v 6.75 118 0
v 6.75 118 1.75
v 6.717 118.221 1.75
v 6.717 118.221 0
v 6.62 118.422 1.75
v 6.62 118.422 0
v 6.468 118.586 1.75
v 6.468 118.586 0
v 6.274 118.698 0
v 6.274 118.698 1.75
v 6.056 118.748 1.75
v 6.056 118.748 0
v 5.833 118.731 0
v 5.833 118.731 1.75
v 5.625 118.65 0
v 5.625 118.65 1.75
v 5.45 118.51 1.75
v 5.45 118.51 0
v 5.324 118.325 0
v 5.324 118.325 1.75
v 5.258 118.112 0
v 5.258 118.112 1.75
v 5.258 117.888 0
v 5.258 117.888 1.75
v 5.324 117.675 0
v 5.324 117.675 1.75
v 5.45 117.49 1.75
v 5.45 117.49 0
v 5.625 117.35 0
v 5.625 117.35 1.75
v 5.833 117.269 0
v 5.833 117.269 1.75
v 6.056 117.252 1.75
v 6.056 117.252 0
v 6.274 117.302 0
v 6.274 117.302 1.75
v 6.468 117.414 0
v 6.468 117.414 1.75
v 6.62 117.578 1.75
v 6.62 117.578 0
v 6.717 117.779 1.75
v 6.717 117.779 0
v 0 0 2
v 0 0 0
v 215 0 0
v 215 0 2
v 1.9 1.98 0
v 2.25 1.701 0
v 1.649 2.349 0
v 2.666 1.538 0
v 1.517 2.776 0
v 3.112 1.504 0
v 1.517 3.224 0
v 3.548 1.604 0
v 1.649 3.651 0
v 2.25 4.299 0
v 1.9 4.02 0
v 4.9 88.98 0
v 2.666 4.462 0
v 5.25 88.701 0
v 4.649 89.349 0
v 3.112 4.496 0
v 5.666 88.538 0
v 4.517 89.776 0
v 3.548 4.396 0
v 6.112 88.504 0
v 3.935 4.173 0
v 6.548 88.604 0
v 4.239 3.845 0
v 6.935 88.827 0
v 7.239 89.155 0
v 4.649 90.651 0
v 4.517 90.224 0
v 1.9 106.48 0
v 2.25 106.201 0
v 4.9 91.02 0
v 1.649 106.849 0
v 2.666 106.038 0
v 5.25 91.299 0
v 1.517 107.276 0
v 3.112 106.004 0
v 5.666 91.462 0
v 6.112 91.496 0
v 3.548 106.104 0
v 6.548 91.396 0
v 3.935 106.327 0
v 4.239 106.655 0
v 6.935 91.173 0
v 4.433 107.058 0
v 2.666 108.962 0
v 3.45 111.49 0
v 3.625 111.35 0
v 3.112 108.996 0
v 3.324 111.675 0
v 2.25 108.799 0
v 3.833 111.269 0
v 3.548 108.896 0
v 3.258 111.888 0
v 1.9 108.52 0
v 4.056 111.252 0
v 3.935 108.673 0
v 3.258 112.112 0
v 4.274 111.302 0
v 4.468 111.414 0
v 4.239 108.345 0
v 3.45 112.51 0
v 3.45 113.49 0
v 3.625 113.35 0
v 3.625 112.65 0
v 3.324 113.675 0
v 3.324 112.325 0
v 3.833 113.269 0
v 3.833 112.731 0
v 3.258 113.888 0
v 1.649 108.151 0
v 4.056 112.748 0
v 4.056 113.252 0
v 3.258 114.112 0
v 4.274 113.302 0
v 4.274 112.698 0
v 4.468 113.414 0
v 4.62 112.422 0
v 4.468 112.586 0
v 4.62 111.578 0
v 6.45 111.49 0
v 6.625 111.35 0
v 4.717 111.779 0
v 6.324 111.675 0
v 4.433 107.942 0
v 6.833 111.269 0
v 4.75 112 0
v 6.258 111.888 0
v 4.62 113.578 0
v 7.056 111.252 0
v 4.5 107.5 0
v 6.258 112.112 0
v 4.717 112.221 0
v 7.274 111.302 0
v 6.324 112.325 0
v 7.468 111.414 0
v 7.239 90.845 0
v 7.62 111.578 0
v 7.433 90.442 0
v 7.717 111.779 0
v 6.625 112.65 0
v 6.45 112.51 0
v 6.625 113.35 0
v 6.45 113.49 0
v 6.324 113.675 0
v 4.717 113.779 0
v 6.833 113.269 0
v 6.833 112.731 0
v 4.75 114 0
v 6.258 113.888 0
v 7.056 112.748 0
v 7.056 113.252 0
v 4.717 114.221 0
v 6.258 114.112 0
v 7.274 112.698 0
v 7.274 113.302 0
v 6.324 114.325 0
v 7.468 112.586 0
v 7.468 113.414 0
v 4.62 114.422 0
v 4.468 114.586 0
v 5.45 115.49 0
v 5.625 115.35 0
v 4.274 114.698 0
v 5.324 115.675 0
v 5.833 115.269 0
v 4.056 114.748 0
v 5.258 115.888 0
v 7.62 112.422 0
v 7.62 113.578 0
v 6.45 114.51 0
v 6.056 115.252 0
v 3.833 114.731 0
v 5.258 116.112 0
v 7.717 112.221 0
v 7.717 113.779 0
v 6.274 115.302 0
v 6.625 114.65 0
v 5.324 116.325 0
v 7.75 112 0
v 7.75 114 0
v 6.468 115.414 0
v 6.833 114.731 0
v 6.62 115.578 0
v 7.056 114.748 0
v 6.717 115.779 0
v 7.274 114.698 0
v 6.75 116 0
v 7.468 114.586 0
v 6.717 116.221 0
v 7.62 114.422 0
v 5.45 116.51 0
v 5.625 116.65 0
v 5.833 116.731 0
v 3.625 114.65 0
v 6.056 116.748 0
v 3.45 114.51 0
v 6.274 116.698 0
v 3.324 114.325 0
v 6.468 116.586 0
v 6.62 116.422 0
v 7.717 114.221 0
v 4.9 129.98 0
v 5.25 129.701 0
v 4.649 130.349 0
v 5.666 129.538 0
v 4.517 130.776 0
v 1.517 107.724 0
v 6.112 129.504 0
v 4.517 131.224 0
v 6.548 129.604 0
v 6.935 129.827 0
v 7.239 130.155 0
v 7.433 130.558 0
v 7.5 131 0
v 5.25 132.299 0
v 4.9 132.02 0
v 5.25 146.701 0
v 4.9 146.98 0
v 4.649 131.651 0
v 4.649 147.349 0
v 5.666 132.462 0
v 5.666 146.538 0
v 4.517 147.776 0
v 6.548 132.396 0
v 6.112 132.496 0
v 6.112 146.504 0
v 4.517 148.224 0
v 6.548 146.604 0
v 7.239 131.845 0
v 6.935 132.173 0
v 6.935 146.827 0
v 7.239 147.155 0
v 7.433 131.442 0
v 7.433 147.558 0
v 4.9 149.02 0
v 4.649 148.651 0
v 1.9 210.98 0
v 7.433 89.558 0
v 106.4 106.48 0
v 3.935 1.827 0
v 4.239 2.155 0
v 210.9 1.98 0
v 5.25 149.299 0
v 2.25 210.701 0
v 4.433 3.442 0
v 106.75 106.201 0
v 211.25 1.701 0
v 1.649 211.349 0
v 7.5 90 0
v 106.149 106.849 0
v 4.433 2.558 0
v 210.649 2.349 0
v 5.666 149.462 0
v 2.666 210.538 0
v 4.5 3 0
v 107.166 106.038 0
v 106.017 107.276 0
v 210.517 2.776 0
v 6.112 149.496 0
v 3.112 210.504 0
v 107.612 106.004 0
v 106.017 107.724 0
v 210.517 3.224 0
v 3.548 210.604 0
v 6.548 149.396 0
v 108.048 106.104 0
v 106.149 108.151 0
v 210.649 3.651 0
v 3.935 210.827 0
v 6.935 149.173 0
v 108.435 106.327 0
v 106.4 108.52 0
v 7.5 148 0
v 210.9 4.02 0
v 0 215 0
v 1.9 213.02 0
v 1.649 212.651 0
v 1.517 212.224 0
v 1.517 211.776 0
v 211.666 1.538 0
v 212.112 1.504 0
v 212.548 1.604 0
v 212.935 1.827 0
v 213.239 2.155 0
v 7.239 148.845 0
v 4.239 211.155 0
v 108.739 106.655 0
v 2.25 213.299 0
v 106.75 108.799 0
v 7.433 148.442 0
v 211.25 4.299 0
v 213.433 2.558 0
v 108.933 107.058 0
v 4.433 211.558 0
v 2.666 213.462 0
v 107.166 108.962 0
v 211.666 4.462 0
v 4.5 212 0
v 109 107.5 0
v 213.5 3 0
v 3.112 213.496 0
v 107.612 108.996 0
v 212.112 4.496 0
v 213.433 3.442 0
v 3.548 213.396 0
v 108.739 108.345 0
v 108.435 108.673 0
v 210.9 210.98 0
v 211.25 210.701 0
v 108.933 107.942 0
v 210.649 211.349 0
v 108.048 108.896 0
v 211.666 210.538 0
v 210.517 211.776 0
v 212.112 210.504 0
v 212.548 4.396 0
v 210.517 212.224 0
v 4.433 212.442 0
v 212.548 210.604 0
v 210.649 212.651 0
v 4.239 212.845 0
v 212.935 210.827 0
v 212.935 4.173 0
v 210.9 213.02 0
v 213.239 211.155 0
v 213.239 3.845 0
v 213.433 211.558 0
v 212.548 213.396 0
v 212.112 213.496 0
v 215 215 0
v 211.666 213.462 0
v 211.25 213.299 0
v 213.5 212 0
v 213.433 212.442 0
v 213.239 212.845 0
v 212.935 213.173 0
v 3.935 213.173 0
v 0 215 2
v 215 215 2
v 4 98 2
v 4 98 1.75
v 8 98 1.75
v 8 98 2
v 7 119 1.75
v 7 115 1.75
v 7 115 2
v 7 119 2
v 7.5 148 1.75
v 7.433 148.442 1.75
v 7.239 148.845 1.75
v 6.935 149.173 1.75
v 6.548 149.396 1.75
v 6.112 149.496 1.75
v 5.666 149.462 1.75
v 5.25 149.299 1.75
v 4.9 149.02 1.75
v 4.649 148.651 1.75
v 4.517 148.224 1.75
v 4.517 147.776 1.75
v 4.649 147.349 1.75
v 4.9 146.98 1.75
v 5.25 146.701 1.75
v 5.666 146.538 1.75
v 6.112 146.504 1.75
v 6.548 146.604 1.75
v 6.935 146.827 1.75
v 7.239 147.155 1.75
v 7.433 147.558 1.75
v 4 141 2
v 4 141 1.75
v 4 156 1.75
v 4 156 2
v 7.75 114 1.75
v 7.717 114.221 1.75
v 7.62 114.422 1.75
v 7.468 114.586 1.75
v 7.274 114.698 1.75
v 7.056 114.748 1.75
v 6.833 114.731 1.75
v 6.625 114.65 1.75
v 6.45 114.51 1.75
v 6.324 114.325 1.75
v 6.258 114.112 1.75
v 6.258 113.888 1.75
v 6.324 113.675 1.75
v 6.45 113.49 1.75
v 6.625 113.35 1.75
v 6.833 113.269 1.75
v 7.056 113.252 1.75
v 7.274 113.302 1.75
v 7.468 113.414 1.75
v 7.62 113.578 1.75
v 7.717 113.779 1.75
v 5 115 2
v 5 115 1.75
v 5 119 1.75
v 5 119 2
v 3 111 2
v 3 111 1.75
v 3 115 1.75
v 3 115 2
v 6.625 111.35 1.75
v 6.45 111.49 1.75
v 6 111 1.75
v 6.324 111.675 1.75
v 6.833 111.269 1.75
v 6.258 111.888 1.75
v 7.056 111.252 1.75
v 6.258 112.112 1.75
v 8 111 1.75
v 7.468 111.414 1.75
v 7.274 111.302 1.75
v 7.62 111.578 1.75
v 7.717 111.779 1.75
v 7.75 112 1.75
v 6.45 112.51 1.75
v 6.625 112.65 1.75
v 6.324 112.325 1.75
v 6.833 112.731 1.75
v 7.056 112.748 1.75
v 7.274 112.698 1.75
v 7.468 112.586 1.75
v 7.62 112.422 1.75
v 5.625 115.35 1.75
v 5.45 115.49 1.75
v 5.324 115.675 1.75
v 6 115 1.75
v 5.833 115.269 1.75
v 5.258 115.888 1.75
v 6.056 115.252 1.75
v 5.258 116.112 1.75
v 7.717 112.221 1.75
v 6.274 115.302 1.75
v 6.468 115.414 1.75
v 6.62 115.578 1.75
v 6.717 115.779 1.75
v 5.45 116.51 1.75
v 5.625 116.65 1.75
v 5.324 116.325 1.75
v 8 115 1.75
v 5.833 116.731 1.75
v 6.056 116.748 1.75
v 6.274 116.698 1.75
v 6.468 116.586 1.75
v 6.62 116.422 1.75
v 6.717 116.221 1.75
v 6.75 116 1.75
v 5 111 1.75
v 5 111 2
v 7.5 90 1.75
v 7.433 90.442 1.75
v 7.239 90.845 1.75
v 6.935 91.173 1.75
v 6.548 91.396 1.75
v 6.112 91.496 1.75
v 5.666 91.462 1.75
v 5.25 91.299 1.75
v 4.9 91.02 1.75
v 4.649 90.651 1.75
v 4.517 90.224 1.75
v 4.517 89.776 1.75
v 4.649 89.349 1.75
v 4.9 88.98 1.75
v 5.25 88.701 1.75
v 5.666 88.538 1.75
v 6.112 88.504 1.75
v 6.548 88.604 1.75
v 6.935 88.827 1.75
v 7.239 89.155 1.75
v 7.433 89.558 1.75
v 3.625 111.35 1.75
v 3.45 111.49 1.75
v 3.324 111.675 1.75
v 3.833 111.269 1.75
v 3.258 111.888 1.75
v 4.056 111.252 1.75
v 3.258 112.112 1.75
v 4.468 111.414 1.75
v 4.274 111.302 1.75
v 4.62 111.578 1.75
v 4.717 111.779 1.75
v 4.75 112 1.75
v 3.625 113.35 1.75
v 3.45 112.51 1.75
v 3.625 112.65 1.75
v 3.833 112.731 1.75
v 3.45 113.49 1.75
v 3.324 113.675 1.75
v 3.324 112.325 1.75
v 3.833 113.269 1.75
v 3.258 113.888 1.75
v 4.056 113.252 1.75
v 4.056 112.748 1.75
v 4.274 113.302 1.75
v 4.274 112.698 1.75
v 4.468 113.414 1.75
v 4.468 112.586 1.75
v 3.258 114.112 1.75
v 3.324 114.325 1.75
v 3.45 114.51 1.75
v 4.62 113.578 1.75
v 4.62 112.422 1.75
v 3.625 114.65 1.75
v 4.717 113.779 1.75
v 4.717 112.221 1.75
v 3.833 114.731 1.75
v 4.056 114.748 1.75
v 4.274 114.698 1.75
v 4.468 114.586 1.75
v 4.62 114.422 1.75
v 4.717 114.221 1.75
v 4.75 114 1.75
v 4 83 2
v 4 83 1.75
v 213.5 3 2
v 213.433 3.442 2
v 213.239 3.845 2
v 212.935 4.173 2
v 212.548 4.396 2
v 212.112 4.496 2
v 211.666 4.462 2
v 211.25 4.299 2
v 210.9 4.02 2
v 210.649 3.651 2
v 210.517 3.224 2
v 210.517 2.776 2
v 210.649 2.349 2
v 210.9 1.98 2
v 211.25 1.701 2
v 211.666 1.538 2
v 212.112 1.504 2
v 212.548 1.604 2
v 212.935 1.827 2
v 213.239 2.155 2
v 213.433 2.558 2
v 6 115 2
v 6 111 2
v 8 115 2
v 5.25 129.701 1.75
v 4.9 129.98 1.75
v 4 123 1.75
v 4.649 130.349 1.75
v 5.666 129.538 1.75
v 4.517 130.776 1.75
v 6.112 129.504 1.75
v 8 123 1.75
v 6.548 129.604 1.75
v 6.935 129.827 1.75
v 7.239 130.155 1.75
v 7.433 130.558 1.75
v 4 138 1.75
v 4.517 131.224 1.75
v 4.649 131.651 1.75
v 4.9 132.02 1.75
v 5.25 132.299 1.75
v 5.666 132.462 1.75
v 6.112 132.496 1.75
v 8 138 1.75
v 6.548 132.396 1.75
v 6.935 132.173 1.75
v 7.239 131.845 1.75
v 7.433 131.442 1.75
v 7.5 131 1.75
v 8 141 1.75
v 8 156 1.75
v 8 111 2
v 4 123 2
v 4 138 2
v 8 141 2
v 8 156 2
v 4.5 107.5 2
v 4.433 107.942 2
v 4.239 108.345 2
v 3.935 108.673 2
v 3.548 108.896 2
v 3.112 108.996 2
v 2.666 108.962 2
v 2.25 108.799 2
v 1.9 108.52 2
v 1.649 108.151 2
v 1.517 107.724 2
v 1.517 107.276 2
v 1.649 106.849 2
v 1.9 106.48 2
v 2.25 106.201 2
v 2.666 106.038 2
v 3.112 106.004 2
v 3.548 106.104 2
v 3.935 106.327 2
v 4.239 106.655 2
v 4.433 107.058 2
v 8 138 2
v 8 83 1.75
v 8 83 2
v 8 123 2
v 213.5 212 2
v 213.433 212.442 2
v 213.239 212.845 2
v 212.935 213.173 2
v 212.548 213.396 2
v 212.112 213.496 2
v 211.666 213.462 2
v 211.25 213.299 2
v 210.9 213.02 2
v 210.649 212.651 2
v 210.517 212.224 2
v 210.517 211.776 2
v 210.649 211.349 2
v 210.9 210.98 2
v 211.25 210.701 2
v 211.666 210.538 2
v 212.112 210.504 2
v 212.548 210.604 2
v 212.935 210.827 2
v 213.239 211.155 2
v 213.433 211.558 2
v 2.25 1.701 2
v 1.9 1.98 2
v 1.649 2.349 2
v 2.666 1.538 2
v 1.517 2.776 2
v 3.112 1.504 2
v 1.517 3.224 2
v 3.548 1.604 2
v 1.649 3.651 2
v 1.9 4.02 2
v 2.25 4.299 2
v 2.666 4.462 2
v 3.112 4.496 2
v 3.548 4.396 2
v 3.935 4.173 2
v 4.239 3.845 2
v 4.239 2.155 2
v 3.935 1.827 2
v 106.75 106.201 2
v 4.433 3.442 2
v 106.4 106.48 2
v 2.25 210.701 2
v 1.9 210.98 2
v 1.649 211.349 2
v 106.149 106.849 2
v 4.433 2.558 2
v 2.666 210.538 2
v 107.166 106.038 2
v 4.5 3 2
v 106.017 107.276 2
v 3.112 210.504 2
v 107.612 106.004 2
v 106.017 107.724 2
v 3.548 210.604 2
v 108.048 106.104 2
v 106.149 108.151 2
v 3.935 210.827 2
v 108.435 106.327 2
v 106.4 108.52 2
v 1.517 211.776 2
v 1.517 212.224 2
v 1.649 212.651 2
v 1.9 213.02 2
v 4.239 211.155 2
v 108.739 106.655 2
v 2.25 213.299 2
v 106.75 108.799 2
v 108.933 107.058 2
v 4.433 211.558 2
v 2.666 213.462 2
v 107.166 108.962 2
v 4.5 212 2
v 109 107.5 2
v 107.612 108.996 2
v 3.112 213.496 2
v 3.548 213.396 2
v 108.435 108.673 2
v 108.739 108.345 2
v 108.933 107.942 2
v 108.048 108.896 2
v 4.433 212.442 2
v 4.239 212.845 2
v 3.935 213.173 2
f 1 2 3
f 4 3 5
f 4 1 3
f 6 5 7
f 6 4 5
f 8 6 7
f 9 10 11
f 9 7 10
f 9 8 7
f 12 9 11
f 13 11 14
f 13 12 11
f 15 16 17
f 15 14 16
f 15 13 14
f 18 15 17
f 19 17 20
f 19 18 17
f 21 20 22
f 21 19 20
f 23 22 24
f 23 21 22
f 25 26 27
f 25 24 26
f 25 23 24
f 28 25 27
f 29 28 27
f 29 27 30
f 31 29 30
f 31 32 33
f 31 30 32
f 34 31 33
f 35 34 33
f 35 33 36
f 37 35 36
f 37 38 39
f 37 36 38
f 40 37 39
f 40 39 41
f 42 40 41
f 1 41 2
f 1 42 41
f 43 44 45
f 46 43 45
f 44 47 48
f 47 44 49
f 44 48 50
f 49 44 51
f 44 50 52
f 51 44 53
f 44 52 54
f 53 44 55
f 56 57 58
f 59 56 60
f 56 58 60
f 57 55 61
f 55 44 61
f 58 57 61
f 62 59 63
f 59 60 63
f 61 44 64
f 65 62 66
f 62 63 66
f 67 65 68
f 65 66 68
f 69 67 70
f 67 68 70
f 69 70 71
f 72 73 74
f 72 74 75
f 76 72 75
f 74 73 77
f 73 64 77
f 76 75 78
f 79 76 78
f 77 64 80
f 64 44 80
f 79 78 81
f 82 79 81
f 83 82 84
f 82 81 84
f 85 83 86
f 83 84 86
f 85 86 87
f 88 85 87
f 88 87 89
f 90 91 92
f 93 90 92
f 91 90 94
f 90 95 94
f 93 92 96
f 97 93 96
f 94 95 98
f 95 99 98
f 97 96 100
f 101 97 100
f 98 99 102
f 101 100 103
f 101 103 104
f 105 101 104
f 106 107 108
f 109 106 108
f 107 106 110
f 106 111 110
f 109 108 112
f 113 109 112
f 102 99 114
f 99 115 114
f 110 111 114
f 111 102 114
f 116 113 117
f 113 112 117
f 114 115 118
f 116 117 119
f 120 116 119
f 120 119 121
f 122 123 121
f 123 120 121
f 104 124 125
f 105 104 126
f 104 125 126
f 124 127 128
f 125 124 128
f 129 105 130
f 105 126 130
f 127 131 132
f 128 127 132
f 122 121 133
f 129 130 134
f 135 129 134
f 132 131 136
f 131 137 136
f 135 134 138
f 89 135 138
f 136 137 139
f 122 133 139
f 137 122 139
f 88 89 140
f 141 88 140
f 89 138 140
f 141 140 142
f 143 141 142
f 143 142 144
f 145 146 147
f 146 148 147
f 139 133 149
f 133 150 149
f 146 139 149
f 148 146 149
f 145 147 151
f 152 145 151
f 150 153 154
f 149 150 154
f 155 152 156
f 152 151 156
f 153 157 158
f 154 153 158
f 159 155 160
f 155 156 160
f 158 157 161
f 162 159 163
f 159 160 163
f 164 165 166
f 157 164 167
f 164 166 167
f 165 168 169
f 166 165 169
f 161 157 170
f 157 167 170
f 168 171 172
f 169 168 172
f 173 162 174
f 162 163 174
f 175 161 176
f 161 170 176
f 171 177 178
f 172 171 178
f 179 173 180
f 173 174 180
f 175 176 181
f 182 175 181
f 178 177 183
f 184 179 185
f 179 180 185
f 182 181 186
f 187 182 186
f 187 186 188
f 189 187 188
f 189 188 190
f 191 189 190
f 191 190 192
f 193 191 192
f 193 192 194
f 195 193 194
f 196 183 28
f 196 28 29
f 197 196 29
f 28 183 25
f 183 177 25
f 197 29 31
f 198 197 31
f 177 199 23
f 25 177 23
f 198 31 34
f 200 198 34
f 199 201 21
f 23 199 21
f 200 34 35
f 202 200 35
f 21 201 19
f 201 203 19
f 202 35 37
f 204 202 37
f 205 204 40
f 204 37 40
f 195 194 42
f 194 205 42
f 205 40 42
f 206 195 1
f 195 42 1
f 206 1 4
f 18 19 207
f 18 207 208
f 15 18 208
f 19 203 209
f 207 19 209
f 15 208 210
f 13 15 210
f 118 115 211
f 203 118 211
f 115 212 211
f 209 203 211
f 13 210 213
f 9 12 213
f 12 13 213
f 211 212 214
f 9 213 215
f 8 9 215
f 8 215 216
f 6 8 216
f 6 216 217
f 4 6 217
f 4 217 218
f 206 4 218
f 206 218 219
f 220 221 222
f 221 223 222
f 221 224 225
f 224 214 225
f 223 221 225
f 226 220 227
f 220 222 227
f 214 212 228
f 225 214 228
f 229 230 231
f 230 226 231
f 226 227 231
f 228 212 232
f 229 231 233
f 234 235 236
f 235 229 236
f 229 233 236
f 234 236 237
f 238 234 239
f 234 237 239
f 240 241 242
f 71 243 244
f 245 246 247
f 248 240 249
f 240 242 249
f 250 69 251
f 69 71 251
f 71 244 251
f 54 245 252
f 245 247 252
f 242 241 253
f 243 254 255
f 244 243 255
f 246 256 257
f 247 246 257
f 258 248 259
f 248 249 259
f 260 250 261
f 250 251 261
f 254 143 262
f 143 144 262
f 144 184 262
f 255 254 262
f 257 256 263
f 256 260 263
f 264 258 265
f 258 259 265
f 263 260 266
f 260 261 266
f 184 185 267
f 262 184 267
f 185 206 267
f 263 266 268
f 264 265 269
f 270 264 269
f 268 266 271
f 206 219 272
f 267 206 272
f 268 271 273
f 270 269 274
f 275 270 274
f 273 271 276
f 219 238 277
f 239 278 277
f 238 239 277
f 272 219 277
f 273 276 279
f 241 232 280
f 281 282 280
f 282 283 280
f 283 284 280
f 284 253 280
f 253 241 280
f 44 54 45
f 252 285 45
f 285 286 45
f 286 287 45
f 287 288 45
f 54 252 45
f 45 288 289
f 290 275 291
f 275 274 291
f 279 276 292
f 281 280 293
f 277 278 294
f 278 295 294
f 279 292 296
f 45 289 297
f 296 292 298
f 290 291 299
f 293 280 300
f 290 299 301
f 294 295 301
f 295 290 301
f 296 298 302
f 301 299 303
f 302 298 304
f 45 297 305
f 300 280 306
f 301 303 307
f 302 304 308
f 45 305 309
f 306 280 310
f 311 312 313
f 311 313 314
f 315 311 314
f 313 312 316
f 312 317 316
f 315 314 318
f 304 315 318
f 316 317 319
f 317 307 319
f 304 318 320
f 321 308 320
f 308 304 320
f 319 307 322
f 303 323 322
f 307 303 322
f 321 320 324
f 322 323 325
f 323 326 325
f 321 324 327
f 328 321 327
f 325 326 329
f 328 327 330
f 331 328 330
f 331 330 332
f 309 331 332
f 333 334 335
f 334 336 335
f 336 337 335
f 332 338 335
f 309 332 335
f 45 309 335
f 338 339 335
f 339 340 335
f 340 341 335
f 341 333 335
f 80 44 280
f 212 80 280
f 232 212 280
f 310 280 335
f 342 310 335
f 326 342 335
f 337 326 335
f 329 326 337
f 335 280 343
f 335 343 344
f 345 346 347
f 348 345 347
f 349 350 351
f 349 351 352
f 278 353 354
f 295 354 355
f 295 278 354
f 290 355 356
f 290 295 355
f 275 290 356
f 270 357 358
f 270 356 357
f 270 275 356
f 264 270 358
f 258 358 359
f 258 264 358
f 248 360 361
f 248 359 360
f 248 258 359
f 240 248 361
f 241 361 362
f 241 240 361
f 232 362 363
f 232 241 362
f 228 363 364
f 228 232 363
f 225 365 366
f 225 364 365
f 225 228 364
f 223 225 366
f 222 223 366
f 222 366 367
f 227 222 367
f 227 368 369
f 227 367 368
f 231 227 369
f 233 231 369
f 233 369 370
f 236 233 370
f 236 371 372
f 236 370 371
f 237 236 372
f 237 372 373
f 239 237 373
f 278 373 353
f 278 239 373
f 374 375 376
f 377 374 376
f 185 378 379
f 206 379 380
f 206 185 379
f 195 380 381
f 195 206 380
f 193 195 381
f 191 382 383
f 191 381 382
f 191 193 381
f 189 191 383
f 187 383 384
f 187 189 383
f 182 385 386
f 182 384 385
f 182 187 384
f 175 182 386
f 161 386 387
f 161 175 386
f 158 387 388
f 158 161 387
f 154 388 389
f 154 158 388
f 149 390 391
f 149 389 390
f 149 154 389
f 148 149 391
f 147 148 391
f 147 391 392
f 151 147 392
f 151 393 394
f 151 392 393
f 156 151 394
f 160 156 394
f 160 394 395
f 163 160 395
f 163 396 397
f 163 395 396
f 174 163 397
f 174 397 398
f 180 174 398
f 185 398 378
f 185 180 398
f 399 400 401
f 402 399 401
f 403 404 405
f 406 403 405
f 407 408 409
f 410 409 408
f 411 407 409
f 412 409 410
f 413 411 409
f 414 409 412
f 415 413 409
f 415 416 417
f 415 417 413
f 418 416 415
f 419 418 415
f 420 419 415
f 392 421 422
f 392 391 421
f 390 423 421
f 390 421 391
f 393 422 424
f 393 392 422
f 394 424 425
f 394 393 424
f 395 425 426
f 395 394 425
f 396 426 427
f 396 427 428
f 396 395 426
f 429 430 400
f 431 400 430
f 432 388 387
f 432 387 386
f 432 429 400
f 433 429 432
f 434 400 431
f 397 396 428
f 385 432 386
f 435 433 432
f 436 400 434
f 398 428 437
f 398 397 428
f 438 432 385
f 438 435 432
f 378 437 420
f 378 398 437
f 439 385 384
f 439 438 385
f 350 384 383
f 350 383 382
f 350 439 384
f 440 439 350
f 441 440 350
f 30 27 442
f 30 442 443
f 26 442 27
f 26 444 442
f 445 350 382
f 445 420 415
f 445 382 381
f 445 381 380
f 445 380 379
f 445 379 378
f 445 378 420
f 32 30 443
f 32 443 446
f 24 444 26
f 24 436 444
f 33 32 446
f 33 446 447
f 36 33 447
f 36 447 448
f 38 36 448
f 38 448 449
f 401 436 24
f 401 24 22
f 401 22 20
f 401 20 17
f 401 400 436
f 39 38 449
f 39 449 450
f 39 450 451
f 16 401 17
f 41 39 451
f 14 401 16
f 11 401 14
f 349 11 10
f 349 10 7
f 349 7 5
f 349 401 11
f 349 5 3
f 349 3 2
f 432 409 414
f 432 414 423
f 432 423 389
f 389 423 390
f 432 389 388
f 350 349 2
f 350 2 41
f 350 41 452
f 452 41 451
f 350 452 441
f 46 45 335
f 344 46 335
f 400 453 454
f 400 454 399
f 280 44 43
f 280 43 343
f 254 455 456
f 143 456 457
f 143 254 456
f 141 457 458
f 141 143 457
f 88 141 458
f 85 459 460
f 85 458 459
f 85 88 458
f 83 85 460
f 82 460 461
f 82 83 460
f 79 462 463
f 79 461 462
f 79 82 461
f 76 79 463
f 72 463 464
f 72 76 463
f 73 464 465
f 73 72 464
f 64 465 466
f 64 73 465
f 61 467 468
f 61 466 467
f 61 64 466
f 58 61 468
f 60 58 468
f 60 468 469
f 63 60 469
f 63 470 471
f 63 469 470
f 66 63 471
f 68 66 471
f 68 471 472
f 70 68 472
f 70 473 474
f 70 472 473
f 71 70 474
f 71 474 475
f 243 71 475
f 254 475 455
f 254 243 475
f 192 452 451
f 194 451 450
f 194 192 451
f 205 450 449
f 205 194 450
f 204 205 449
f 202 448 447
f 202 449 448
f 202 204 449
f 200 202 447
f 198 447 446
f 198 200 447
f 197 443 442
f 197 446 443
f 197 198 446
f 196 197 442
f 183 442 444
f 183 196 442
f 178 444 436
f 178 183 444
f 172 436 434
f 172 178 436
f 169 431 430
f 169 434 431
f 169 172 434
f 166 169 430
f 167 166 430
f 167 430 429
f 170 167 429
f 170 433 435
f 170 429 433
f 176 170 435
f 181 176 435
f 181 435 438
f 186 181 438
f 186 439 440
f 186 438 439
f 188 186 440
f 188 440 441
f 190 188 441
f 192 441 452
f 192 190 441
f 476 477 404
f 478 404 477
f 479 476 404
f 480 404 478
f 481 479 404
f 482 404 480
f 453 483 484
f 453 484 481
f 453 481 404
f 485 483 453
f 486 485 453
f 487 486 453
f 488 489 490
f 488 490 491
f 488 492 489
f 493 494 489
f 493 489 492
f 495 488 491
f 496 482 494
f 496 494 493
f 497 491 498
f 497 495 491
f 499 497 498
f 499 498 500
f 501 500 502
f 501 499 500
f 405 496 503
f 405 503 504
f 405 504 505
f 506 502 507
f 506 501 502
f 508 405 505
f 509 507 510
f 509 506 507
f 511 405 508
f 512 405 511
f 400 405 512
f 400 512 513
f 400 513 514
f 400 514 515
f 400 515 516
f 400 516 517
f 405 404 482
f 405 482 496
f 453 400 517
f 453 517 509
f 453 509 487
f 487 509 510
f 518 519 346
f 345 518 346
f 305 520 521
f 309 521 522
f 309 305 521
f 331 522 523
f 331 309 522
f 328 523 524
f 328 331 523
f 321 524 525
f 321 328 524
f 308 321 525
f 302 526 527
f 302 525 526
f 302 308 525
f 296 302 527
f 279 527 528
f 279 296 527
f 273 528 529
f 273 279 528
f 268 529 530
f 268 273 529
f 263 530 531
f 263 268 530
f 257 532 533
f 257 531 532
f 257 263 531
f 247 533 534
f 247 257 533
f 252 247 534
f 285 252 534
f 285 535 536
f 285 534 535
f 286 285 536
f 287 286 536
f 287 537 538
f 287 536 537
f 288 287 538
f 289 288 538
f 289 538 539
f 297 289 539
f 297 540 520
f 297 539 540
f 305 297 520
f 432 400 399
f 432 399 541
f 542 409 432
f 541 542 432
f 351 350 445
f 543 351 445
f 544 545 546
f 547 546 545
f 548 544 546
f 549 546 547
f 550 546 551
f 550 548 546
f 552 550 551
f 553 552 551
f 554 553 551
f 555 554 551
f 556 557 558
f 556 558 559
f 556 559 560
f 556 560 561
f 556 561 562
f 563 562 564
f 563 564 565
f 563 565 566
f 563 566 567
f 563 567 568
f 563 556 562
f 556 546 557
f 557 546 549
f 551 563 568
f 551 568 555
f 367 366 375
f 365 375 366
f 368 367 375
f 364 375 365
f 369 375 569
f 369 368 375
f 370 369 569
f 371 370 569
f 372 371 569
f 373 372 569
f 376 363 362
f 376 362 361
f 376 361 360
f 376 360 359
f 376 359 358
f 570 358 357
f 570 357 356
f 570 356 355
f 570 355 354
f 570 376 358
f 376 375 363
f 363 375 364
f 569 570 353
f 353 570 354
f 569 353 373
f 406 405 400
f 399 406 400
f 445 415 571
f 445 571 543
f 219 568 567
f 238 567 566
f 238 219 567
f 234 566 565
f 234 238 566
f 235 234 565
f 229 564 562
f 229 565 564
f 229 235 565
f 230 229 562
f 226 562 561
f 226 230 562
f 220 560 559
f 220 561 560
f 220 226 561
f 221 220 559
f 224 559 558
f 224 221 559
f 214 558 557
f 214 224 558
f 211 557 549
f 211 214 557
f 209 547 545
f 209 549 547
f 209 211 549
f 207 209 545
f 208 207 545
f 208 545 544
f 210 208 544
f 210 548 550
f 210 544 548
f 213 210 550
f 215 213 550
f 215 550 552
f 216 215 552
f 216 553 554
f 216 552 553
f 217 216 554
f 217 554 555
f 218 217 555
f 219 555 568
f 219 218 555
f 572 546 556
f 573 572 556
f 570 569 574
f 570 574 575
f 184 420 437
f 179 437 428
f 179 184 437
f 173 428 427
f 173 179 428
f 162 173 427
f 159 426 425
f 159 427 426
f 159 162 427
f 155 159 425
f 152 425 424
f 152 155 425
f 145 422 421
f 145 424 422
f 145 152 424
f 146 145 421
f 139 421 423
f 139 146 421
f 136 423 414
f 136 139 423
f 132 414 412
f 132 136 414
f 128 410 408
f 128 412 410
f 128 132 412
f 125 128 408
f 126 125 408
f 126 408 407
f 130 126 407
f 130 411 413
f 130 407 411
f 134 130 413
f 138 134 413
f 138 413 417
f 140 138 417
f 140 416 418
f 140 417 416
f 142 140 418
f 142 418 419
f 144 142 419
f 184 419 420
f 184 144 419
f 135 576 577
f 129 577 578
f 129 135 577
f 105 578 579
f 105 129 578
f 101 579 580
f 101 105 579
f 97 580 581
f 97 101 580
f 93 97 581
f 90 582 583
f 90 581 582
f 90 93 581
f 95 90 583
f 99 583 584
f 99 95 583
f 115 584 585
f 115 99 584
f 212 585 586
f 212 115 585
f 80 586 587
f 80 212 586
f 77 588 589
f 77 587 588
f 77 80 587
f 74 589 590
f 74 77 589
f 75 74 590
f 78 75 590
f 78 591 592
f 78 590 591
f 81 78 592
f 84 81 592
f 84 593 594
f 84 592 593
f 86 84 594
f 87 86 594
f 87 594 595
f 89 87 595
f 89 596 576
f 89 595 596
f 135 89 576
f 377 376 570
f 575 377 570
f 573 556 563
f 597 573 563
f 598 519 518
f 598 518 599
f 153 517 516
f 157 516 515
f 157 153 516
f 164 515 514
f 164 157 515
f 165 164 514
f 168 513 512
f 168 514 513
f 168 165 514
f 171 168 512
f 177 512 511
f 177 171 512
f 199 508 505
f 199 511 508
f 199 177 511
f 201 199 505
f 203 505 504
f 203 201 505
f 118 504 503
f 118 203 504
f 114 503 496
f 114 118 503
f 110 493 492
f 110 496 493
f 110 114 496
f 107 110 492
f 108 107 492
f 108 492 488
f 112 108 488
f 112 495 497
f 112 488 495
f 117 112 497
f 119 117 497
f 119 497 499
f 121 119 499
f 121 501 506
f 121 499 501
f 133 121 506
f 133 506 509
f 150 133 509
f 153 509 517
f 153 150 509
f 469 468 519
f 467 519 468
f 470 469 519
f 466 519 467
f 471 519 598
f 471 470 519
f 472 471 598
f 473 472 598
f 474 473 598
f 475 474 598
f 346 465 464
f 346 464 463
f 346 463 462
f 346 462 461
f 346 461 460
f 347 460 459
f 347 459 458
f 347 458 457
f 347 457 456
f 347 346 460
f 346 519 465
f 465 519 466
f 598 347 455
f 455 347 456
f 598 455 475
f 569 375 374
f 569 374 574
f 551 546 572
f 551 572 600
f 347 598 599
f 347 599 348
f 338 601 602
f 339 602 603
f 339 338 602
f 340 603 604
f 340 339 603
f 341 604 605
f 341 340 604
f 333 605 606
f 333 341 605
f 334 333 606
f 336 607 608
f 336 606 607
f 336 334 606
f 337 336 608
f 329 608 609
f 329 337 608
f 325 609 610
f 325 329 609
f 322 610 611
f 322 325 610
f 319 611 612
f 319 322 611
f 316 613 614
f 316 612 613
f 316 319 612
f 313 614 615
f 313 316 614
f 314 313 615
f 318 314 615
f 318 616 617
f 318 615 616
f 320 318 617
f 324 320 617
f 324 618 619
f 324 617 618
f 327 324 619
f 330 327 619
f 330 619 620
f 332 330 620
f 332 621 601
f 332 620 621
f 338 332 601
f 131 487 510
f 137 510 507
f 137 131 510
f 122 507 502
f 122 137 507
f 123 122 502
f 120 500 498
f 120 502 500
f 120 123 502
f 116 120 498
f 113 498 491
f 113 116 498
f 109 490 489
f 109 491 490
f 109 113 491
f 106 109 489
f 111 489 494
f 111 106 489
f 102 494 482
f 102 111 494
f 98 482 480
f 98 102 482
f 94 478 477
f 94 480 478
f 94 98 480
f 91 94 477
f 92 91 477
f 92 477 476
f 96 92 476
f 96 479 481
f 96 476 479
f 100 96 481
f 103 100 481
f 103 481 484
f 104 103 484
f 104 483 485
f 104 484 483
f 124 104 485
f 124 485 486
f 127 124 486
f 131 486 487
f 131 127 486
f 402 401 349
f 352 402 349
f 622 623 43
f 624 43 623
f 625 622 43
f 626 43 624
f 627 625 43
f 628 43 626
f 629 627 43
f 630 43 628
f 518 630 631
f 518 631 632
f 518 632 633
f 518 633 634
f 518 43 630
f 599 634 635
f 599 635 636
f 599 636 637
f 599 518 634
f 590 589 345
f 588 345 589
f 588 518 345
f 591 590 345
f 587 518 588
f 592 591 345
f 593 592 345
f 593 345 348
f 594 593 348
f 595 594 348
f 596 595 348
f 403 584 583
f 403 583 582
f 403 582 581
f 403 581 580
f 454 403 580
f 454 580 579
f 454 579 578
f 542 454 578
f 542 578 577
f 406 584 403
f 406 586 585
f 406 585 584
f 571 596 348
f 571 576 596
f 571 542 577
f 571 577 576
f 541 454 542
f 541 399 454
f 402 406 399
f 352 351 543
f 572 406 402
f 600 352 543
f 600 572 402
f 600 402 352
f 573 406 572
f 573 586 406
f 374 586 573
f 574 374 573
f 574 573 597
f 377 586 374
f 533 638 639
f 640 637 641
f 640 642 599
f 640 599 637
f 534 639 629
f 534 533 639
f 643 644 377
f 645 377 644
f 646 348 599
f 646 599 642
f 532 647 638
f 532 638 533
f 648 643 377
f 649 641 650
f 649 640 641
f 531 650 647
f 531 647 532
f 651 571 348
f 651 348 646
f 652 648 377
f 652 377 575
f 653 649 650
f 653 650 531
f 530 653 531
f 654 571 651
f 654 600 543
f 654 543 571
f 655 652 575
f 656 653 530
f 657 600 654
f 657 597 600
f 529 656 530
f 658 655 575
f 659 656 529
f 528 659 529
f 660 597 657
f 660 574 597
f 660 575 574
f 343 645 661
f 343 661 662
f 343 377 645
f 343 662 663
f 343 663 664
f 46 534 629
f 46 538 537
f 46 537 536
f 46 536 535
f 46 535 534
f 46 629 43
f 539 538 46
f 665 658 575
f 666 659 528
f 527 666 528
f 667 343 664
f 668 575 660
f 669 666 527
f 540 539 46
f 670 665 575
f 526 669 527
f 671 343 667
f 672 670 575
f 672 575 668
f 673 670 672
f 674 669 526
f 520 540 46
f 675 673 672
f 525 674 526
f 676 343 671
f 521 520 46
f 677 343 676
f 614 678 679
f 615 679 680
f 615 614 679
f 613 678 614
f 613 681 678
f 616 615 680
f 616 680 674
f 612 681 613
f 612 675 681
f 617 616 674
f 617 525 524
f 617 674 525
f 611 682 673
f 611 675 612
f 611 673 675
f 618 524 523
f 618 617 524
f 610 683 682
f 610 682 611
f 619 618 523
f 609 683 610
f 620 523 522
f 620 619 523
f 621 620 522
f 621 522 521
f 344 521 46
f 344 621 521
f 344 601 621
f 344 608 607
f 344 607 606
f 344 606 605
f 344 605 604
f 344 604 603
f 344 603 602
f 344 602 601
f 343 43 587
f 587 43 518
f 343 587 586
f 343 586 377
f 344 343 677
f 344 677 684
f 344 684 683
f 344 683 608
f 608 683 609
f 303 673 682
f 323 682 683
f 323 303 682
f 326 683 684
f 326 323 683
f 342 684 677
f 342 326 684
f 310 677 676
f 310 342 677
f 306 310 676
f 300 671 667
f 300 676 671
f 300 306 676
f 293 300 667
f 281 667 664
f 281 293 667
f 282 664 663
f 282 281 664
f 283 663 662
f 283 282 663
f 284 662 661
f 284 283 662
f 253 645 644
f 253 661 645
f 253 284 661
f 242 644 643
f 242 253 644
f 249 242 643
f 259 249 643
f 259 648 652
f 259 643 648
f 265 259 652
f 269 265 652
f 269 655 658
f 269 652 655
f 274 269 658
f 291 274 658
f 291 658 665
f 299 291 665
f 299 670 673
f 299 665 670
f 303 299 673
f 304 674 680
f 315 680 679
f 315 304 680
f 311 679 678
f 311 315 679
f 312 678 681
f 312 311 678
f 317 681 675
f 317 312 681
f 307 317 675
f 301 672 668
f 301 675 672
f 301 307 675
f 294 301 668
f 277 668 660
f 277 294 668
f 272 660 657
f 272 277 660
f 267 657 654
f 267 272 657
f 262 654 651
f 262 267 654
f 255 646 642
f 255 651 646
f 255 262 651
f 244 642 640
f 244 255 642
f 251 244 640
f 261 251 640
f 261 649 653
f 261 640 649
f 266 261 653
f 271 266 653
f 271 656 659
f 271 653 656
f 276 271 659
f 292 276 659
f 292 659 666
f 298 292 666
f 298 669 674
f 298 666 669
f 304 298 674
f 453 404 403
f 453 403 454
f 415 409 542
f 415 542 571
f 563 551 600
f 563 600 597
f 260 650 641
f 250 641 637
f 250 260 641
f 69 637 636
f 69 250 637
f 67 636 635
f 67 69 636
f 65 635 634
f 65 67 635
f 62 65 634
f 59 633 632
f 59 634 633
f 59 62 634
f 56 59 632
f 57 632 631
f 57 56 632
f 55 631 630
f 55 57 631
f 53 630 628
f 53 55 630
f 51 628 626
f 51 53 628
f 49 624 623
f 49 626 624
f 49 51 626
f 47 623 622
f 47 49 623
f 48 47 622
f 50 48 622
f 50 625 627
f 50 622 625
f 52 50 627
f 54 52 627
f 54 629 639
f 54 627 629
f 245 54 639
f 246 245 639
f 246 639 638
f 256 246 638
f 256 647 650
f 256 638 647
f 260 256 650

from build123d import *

# Parameters (mm, degrees)
BOX005_W          = 2
BOX005_H          = 4
BOX005_DEPTH      = 0.5
BOX006_W          = 2
BOX006_H          = 4
BOX006_DEPTH      = 0.5
BOX004_W          = 2
BOX004_H          = 4
BOX004_DEPTH      = 0.5
BOX003_W          = 4
BOX003_H          = 15
BOX003_DEPTH      = 0.5
BOX002_W          = 4
BOX002_H          = 15
BOX002_DEPTH      = 0.5
BOX001_W          = 4
BOX001_H          = 15
BOX001_DEPTH      = 0.5
CYLINDER012_R     = 0.75
CYLINDER012_DEPTH = 10
CYLINDER011_R     = 0.75
CYLINDER011_DEPTH = 10
CYLINDER010_R     = 0.75
CYLINDER010_DEPTH = 10
CYLINDER014_R     = 0.75
CYLINDER014_DEPTH = 10
CYLINDER013_R     = 0.75
CYLINDER013_DEPTH = 10
CYLINDER009_R     = 0.75
CYLINDER009_DEPTH = 10
CYLINDER006_R     = 1.5
CYLINDER006_DEPTH = 10
CYLINDER007_R     = 1.5
CYLINDER007_DEPTH = 10
CYLINDER008_R     = 1.5
CYLINDER008_DEPTH = 10
CYLINDER005_R     = 1.5
CYLINDER005_DEPTH = 10
CYLINDER003_R     = 1.5
CYLINDER003_DEPTH = 10
CYLINDER004_R     = 1.5
CYLINDER004_DEPTH = 10
CYLINDER002_R     = 1.5
CYLINDER002_DEPTH = 10
CYLINDER_R        = 1.5
CYLINDER_DEPTH    = 10
CYLINDER001_R     = 1.5
CYLINDER001_DEPTH = 10
BOX_W             = 215
BOX_H             = 215
BOX_DEPTH         = 2


with BuildPart() as cube005:
    # Box005 → Box005 (new body)
    with BuildSketch(Plane(origin=(6, 111, 1.75), x_dir=(1, 0, 0), z_dir=(0, 0, 1))):
        with Locations((1, 2)):
            Rectangle(BOX005_W, BOX005_H)
    extrude(amount=BOX005_DEPTH)


with BuildPart() as cube006:
    # Box006 → Box006 (new body)
    with BuildSketch(Plane(origin=(5, 115, 1.75), x_dir=(1, 0, 0), z_dir=(0, 0, 1))):
        with Locations((1, 2)):
            Rectangle(BOX006_W, BOX006_H)
    extrude(amount=BOX006_DEPTH)


with BuildPart() as cube004:
    # Box004 → Box004 (new body)
    with BuildSketch(Plane(origin=(3, 111, 1.75), x_dir=(1, 0, 0), z_dir=(0, 0, 1))):
        with Locations((1, 2)):
            Rectangle(BOX004_W, BOX004_H)
    extrude(amount=BOX004_DEPTH)


with BuildPart() as cube003:
    # Box003 → Box003 (new body)
    with BuildSketch(Plane(origin=(4, 141, 1.75), x_dir=(1, 0, 0), z_dir=(0, 0, 1))):
        with Locations((2, 7.5)):
            Rectangle(BOX003_W, BOX003_H)
    extrude(amount=BOX003_DEPTH)


with BuildPart() as cube002:
    # Box002 → Box002 (new body)
    with BuildSketch(Plane(origin=(4, 123, 1.75), x_dir=(1, 0, 0), z_dir=(0, 0, 1))):
        with Locations((2, 7.5)):
            Rectangle(BOX002_W, BOX002_H)
    extrude(amount=BOX002_DEPTH)


with BuildPart() as cube001:
    # Box001 → Box001 (new body)
    with BuildSketch(Plane(origin=(4, 83, 1.75), x_dir=(1, 0, 0), z_dir=(0, 0, 1))):
        with Locations((2, 7.5)):
            Rectangle(BOX001_W, BOX001_H)
    extrude(amount=BOX001_DEPTH)


with BuildPart() as cylinder012:
    # Cylinder012 → Cylinder012 (new body)
    with BuildSketch(Plane(origin=(6, 118, 0), x_dir=(1, 0, 0), z_dir=(0, 0, 1))):
        Circle(CYLINDER012_R)
    extrude(amount=CYLINDER012_DEPTH)


with BuildPart() as cylinder011:
    # Cylinder011 → Cylinder011 (new body)
    with BuildSketch(Plane(origin=(6, 116, 0), x_dir=(1, 0, 0), z_dir=(0, 0, 1))):
        Circle(CYLINDER011_R)
    extrude(amount=CYLINDER011_DEPTH)


with BuildPart() as cylinder010:
    # Cylinder010 → Cylinder010 (new body)
    with BuildSketch(Plane(origin=(4, 114, 0), x_dir=(1, 0, 0), z_dir=(0, 0, 1))):
        Circle(CYLINDER010_R)
    extrude(amount=CYLINDER010_DEPTH)


with BuildPart() as cylinder014:
    # Cylinder014 → Cylinder014 (new body)
    with BuildSketch(Plane(origin=(7, 114, 0), x_dir=(1, 0, 0), z_dir=(0, 0, 1))):
        Circle(CYLINDER014_R)
    extrude(amount=CYLINDER014_DEPTH)


with BuildPart() as cylinder013:
    # Cylinder013 → Cylinder013 (new body)
    with BuildSketch(Plane(origin=(7, 112, 0), x_dir=(1, 0, 0), z_dir=(0, 0, 1))):
        Circle(CYLINDER013_R)
    extrude(amount=CYLINDER013_DEPTH)


with BuildPart() as cylinder009:
    # Cylinder009 → Cylinder009 (new body)
    with BuildSketch(Plane(origin=(4, 112, 0), x_dir=(1, 0, 0), z_dir=(0, 0, 1))):
        Circle(CYLINDER009_R)
    extrude(amount=CYLINDER009_DEPTH)


with BuildPart() as cylinder006:
    # Cylinder006 → Cylinder006 (new body)
    with BuildSketch(Plane(origin=(3, 107.5, 0), x_dir=(1, 0, 0), z_dir=(0, 0, 1))):
        Circle(CYLINDER006_R)
    extrude(amount=CYLINDER006_DEPTH)


with BuildPart() as cylinder007:
    # Cylinder007 → Cylinder007 (new body)
    with BuildSketch(Plane(origin=(6, 131, 0), x_dir=(1, 0, 0), z_dir=(0, 0, 1))):
        Circle(CYLINDER007_R)
    extrude(amount=CYLINDER007_DEPTH)


with BuildPart() as cylinder008:
    # Cylinder008 → Cylinder008 (new body)
    with BuildSketch(Plane(origin=(6, 148, 0), x_dir=(1, 0, 0), z_dir=(0, 0, 1))):
        Circle(CYLINDER008_R)
    extrude(amount=CYLINDER008_DEPTH)


with BuildPart() as cylinder005:
    # Cylinder005 → Cylinder005 (new body)
    with BuildSketch(Plane(origin=(6, 90, 0), x_dir=(1, 0, 0), z_dir=(0, 0, 1))):
        Circle(CYLINDER005_R)
    extrude(amount=CYLINDER005_DEPTH)


with BuildPart() as cylinder003:
    # Cylinder003 → Cylinder003 (new body)
    with BuildSketch(Plane(origin=(3, 212, 0), x_dir=(1, 0, 0), z_dir=(0, 0, 1))):
        Circle(CYLINDER003_R)
    extrude(amount=CYLINDER003_DEPTH)


with BuildPart() as cylinder004:
    # Cylinder004 → Cylinder004 (new body)
    with BuildSketch(Plane(origin=(107.5, 107.5, 0), x_dir=(1, 0, 0), z_dir=(0, 0, 1))):
        Circle(CYLINDER004_R)
    extrude(amount=CYLINDER004_DEPTH)


with BuildPart() as cylinder002:
    # Cylinder002 → Cylinder002 (new body)
    with BuildSketch(Plane(origin=(212, 212, 0), x_dir=(1, 0, 0), z_dir=(0, 0, 1))):
        Circle(CYLINDER002_R)
    extrude(amount=CYLINDER002_DEPTH)


with BuildPart() as cylinder:
    # Cylinder → Cylinder (new body)
    with BuildSketch(Plane(origin=(212, 3, 0), x_dir=(1, 0, 0), z_dir=(0, 0, 1))):
        Circle(CYLINDER_R)
    extrude(amount=CYLINDER_DEPTH)


with BuildPart() as cylinder001:
    # Cylinder001 → Cylinder001 (new body)
    with BuildSketch(Plane(origin=(3, 3, 0), x_dir=(1, 0, 0), z_dir=(0, 0, 1))):
        Circle(CYLINDER001_R)
    extrude(amount=CYLINDER001_DEPTH)


with BuildPart() as cut020:
    # Box → Box (new body)
    with BuildSketch(Plane.XY):
        with Locations((107.5, 107.5)):
            Rectangle(BOX_W, BOX_H)
    extrude(amount=BOX_DEPTH)

    # Cut: cut Cylinder001
    add(cylinder001.part, mode=Mode.SUBTRACT)

    # Cut001: cut Cylinder
    add(cylinder.part, mode=Mode.SUBTRACT)

    # Cut002: cut Cylinder002
    add(cylinder002.part, mode=Mode.SUBTRACT)

    # Cut003: cut Cylinder004
    add(cylinder004.part, mode=Mode.SUBTRACT)

    # Cut004: cut Cylinder003
    add(cylinder003.part, mode=Mode.SUBTRACT)

    # Cut005: cut Cylinder005
    add(cylinder005.part, mode=Mode.SUBTRACT)

    # Cut006: cut Cylinder008
    add(cylinder008.part, mode=Mode.SUBTRACT)

    # Cut007: cut Cylinder007
    add(cylinder007.part, mode=Mode.SUBTRACT)

    # Cut008: cut Cylinder006
    add(cylinder006.part, mode=Mode.SUBTRACT)

    # Cut009: cut Cylinder009
    add(cylinder009.part, mode=Mode.SUBTRACT)

    # Cut010: cut Cylinder013
    add(cylinder013.part, mode=Mode.SUBTRACT)

    # Cut011: cut Cylinder014
    add(cylinder014.part, mode=Mode.SUBTRACT)

    # Cut012: cut Cylinder010
    add(cylinder010.part, mode=Mode.SUBTRACT)

    # Cut013: cut Cylinder011
    add(cylinder011.part, mode=Mode.SUBTRACT)

    # Cut014: cut Cylinder012
    add(cylinder012.part, mode=Mode.SUBTRACT)

    # Cut015: cut Cube001
    add(cube001.part, mode=Mode.SUBTRACT)

    # Cut016: cut Cube002
    add(cube002.part, mode=Mode.SUBTRACT)

    # Cut017: cut Cube003
    add(cube003.part, mode=Mode.SUBTRACT)

    # Cut018: cut Cube004
    add(cube004.part, mode=Mode.SUBTRACT)

    # Cut019: cut Cube006
    add(cube006.part, mode=Mode.SUBTRACT)

    # Cut020: cut Cube005
    add(cube005.part, mode=Mode.SUBTRACT)


solid = cut020.part
